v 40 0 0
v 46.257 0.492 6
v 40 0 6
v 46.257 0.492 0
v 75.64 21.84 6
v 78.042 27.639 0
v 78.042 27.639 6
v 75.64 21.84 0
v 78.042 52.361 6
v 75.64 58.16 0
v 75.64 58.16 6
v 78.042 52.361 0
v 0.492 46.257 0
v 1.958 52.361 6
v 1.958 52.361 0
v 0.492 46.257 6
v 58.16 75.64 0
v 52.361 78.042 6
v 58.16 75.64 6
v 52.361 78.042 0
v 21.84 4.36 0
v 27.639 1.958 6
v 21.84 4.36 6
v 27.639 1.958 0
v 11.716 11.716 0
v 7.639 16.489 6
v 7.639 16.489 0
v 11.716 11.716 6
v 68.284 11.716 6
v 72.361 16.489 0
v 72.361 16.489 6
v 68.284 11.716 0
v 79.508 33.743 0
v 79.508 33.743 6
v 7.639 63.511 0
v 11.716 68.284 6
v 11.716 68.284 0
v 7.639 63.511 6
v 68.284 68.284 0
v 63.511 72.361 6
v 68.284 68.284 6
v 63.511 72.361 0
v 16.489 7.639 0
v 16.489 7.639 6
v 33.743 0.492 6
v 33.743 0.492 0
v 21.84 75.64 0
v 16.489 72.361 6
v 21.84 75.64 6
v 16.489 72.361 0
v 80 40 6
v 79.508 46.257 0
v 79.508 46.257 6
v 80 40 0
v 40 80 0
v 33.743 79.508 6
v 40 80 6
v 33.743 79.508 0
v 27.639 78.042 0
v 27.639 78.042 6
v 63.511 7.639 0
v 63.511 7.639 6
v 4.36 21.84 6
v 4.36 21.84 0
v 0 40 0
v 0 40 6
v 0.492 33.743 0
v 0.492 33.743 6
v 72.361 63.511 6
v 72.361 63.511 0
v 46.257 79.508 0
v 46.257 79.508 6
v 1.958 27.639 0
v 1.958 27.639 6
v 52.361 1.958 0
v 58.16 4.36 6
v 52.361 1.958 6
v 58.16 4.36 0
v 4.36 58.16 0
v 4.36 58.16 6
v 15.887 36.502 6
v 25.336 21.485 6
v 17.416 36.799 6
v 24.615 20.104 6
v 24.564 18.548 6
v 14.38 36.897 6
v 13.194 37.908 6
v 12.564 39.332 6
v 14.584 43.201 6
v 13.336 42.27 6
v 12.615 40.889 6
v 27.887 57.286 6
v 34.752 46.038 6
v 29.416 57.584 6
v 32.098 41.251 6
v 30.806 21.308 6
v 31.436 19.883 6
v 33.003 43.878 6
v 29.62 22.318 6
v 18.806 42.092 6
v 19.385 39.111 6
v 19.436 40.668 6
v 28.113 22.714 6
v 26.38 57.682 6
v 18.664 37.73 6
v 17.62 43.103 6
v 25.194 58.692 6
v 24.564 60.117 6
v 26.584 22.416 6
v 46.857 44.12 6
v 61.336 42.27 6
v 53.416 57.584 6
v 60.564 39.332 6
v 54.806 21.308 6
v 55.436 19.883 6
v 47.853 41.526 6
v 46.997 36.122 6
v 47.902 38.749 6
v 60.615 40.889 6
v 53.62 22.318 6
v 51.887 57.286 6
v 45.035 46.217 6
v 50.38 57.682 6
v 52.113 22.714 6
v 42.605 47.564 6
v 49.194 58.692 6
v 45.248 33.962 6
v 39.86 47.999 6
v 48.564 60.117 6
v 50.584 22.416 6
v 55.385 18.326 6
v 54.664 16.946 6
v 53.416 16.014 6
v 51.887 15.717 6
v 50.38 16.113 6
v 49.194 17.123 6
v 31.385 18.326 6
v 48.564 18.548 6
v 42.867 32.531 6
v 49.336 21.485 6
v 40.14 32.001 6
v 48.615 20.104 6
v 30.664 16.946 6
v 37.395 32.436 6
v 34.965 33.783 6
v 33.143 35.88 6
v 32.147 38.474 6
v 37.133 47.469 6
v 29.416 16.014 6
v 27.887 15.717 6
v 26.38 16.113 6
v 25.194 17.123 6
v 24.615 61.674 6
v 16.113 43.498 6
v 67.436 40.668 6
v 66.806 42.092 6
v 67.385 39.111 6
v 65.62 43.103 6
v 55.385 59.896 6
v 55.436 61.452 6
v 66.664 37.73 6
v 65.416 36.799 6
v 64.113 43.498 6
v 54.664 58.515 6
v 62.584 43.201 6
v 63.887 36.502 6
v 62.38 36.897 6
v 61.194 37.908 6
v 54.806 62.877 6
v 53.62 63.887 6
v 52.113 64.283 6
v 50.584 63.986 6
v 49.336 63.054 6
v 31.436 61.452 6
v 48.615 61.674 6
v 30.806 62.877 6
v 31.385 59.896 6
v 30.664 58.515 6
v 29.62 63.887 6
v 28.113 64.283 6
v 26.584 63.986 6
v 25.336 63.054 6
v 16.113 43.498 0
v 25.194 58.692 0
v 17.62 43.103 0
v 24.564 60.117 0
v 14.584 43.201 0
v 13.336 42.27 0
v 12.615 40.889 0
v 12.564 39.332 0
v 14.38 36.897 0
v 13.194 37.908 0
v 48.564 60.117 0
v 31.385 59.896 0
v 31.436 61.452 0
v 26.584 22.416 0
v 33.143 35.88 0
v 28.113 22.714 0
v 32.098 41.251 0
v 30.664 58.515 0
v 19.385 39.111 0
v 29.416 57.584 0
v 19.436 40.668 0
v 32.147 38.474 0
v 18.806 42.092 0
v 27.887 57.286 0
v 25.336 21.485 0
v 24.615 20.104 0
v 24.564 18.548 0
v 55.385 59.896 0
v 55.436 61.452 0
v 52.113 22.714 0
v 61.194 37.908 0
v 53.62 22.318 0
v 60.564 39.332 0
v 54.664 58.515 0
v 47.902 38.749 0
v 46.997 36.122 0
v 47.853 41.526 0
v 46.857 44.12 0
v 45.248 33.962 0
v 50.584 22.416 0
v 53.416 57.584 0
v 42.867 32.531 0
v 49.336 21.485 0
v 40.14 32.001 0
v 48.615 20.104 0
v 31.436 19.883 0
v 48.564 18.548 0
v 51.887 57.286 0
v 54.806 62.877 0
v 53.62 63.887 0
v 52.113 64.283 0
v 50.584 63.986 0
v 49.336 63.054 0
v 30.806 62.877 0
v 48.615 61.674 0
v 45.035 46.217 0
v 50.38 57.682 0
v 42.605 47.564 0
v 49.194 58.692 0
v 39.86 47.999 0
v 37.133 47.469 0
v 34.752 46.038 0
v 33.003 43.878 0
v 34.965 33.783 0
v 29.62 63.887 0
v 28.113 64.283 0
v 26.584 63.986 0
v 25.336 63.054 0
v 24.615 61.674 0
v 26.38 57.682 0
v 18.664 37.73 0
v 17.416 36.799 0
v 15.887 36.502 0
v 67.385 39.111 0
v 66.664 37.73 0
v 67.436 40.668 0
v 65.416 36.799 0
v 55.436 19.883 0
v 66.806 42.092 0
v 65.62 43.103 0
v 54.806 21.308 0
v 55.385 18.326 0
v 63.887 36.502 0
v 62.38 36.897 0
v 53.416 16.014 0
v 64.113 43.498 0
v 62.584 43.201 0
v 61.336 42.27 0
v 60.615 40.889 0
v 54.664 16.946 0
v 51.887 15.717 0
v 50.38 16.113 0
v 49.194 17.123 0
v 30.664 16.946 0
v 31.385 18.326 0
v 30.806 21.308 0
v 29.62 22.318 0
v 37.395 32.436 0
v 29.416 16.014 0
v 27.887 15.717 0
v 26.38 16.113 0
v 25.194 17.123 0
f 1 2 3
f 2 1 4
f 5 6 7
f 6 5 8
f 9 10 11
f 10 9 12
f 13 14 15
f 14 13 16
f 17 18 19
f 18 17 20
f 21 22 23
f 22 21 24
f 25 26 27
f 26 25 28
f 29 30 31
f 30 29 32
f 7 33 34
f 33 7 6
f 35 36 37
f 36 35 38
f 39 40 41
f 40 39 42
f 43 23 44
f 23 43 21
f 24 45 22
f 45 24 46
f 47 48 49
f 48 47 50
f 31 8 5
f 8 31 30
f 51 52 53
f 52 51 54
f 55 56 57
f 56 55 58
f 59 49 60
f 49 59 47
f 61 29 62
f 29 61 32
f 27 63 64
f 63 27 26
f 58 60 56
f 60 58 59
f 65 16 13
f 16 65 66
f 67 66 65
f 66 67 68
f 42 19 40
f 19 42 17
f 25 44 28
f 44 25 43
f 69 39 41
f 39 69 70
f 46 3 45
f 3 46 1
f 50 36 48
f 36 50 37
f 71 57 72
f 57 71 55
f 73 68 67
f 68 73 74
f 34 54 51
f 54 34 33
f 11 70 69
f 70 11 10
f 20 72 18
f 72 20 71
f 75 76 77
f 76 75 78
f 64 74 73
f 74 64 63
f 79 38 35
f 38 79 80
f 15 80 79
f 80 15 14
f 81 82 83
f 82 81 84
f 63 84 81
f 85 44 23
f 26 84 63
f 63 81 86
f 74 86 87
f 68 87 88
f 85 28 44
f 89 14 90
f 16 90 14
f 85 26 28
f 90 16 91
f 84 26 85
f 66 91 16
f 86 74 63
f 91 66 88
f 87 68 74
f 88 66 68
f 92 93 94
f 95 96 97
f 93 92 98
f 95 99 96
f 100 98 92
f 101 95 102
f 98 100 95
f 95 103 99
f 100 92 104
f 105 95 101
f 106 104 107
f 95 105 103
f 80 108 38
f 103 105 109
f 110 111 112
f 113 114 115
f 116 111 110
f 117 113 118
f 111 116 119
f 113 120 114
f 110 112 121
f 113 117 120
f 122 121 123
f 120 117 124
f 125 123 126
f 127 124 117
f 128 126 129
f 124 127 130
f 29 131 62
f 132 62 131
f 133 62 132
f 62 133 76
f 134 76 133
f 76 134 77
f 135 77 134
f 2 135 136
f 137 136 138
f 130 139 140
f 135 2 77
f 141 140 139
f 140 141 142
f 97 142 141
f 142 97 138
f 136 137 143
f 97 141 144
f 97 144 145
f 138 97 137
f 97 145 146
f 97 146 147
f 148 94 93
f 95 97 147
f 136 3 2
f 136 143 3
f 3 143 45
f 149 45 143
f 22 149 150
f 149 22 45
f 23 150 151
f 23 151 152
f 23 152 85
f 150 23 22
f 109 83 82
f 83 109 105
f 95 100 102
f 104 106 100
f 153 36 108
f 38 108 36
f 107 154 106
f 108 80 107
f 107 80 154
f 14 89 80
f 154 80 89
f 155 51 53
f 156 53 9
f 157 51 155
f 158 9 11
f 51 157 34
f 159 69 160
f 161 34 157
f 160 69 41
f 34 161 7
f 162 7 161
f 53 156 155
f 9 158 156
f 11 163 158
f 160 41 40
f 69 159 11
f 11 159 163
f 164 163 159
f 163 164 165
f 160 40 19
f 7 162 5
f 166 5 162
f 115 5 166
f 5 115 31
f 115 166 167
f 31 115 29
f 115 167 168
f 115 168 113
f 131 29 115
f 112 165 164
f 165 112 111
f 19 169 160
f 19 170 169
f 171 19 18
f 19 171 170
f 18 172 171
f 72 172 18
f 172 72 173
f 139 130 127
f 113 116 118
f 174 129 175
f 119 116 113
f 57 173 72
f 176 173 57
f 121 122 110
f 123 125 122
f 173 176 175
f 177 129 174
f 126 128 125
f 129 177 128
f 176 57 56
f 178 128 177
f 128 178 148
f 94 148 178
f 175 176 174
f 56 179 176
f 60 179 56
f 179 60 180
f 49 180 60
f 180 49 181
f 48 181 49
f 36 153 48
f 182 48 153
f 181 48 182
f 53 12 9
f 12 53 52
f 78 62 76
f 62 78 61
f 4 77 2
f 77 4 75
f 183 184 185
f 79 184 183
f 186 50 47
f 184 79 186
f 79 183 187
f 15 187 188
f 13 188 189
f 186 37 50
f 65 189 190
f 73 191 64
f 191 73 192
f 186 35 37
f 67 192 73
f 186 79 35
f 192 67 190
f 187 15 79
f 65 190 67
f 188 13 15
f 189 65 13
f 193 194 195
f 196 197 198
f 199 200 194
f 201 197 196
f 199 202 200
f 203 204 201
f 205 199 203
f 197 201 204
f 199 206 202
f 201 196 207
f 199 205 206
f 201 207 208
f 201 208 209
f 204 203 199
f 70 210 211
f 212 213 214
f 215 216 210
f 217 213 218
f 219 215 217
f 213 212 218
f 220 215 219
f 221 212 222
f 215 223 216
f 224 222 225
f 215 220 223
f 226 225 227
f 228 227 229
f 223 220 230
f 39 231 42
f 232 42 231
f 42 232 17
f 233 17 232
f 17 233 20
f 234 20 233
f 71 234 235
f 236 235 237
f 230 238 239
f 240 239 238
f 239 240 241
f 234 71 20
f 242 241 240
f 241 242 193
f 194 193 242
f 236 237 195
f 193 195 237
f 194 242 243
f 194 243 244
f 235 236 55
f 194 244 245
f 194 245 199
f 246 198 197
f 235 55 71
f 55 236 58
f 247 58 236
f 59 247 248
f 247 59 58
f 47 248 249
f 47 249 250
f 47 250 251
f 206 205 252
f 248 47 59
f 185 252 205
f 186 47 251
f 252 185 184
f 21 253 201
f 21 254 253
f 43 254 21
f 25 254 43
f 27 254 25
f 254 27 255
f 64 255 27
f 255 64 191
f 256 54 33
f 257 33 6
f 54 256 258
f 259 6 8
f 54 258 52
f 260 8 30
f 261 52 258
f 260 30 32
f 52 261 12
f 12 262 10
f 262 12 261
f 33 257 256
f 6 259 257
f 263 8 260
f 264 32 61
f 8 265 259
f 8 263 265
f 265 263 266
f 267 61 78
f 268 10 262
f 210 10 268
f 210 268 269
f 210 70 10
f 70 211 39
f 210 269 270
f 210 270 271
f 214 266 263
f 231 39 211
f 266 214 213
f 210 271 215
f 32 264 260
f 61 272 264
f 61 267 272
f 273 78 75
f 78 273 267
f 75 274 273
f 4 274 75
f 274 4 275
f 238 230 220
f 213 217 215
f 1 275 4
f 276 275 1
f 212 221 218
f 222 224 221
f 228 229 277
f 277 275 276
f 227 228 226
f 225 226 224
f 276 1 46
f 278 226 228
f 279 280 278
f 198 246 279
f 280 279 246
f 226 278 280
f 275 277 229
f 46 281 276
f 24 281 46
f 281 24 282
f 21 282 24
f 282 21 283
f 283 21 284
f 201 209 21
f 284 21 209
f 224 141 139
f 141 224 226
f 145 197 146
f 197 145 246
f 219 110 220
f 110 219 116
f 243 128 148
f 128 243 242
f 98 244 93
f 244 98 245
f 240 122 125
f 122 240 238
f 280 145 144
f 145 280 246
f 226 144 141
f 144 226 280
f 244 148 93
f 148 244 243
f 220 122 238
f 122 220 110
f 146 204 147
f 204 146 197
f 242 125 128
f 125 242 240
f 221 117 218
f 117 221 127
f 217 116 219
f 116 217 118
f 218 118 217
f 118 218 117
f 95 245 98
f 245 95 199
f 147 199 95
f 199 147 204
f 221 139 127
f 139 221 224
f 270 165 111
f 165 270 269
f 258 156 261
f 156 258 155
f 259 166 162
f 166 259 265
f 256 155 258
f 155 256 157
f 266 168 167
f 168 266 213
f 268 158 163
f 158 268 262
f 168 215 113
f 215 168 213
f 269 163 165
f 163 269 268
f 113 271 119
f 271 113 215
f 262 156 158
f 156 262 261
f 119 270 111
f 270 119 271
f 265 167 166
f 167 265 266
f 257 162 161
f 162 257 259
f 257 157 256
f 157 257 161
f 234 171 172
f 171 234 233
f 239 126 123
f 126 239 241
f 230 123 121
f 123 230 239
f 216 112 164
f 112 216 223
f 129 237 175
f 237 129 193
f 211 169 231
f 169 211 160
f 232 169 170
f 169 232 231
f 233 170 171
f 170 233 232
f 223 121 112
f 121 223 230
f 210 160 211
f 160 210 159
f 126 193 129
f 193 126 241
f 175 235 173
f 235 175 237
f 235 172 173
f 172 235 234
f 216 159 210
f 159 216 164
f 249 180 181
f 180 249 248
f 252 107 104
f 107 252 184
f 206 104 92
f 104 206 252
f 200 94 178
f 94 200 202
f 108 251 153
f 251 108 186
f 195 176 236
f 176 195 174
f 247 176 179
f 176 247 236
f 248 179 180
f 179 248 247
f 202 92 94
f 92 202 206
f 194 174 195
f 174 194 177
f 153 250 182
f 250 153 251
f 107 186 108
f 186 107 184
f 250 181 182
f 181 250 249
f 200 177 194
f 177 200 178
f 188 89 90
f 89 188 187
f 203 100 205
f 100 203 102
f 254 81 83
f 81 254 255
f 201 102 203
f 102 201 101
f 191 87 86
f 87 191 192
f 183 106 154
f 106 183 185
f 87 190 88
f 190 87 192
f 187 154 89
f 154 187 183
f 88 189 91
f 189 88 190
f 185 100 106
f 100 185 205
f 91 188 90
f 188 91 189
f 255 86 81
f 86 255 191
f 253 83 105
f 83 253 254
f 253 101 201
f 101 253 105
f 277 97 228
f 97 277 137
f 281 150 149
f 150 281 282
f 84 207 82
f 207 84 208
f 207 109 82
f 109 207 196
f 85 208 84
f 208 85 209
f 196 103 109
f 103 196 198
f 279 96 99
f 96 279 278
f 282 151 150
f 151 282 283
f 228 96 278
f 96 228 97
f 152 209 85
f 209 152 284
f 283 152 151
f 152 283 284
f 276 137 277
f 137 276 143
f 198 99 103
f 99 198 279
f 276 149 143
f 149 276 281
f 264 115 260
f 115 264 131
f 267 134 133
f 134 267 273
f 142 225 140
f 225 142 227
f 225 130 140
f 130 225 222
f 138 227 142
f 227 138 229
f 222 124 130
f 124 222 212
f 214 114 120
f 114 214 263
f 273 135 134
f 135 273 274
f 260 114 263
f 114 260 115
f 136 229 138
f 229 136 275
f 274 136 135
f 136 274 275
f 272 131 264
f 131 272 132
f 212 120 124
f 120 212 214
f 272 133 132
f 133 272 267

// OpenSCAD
$fn = 32;

// ----------------------------------------------------------------------
// Spacer plate: round flange R40, 6 bolts
// ----------------------------------------------------------------------

// --- parameters (mm) ---
bore_r = 8;               // centre bore radius
bolt_r = 3.5;             // bolt hole radius
plate_t = 6;              // plate thickness, Z (extrusion height)
flange_r = 40;            // flange radius
n_bolt = 6;               // bolt hole count
ring_r = 24;              // bolt circle radius

profile = [[80, 40], [79.508, 46.257], [78.042, 52.361], [75.64, 58.16], [72.361, 63.511], [68.284, 68.284], [63.511, 72.361], [58.16, 75.64], [52.361, 78.042], [46.257, 79.508], [40, 80], [33.743, 79.508], [27.639, 78.042], [21.84, 75.64], [16.489, 72.361], [11.716, 68.284], [7.639, 63.511], [4.36, 58.16], [1.958, 52.361], [0.492, 46.257], [0, 40], [0.492, 33.743], [1.958, 27.639], [4.36, 21.84], [7.639, 16.489], [11.716, 11.716], [16.489, 7.639], [21.84, 4.36], [27.639, 1.958], [33.743, 0.492], [40, 0], [46.257, 0.492], [52.361, 1.958], [58.16, 4.36], [63.511, 7.639], [68.284, 11.716], [72.361, 16.489], [75.64, 21.84], [78.042, 27.639], [79.508, 33.743]];  // primary outline, 40 points, counter clockwise
void_1 = [[47.853, 41.526], [46.857, 44.12], [45.035, 46.217], [42.605, 47.564], [39.86, 47.999], [37.133, 47.469], [34.752, 46.038], [33.003, 43.878], [32.098, 41.251], [32.147, 38.474], [33.143, 35.88], [34.965, 33.783], [37.395, 32.436], [40.14, 32.001], [42.867, 32.531], [45.248, 33.962], [46.997, 36.122], [47.902, 38.749]];  // centre bore, 18 points
void_2 = [[67.436, 40.668], [66.806, 42.092], [65.62, 43.103], [64.113, 43.498], [62.584, 43.201], [61.336, 42.27], [60.615, 40.889], [60.564, 39.332], [61.194, 37.908], [62.38, 36.897], [63.887, 36.502], [65.416, 36.799], [66.664, 37.73], [67.385, 39.111]];  // bolt hole 1, 14 points
void_3 = [[55.436, 61.452], [54.806, 62.877], [53.62, 63.887], [52.113, 64.283], [50.584, 63.986], [49.336, 63.054], [48.615, 61.674], [48.564, 60.117], [49.194, 58.692], [50.38, 57.682], [51.887, 57.286], [53.416, 57.584], [54.664, 58.515], [55.385, 59.896]];  // bolt hole 2, 14 points
void_4 = [[31.436, 61.452], [30.806, 62.877], [29.62, 63.887], [28.113, 64.283], [26.584, 63.986], [25.336, 63.054], [24.615, 61.674], [24.564, 60.117], [25.194, 58.692], [26.38, 57.682], [27.887, 57.286], [29.416, 57.584], [30.664, 58.515], [31.385, 59.896]];  // bolt hole 3, 14 points
void_5 = [[19.436, 40.668], [18.806, 42.092], [17.62, 43.103], [16.113, 43.498], [14.584, 43.201], [13.336, 42.27], [12.615, 40.889], [12.564, 39.332], [13.194, 37.908], [14.38, 36.897], [15.887, 36.502], [17.416, 36.799], [18.664, 37.73], [19.385, 39.111]];  // bolt hole 4, 14 points
void_6 = [[31.436, 19.883], [30.806, 21.308], [29.62, 22.318], [28.113, 22.714], [26.584, 22.416], [25.336, 21.485], [24.615, 20.104], [24.564, 18.548], [25.194, 17.123], [26.38, 16.113], [27.887, 15.717], [29.416, 16.014], [30.664, 16.946], [31.385, 18.326]];  // bolt hole 5, 14 points
void_7 = [[55.436, 19.883], [54.806, 21.308], [53.62, 22.318], [52.113, 22.714], [50.584, 22.416], [49.336, 21.485], [48.615, 20.104], [48.564, 18.548], [49.194, 17.123], [50.38, 16.113], [51.887, 15.717], [53.416, 16.014], [54.664, 16.946], [55.385, 18.326]];  // bolt hole 6, 14 points

// --- the one profile operation ---
difference() {
  linear_extrude(height = plate_t) polygon(points = profile);
  translate([0, 0, -1])
    linear_extrude(height = plate_t + 2) polygon(points = void_1);
  translate([0, 0, -1])
    linear_extrude(height = plate_t + 2) polygon(points = void_2);
  translate([0, 0, -1])
    linear_extrude(height = plate_t + 2) polygon(points = void_3);
  translate([0, 0, -1])
    linear_extrude(height = plate_t + 2) polygon(points = void_4);
  translate([0, 0, -1])
    linear_extrude(height = plate_t + 2) polygon(points = void_5);
  translate([0, 0, -1])
    linear_extrude(height = plate_t + 2) polygon(points = void_6);
  translate([0, 0, -1])
    linear_extrude(height = plate_t + 2) polygon(points = void_7);
}
